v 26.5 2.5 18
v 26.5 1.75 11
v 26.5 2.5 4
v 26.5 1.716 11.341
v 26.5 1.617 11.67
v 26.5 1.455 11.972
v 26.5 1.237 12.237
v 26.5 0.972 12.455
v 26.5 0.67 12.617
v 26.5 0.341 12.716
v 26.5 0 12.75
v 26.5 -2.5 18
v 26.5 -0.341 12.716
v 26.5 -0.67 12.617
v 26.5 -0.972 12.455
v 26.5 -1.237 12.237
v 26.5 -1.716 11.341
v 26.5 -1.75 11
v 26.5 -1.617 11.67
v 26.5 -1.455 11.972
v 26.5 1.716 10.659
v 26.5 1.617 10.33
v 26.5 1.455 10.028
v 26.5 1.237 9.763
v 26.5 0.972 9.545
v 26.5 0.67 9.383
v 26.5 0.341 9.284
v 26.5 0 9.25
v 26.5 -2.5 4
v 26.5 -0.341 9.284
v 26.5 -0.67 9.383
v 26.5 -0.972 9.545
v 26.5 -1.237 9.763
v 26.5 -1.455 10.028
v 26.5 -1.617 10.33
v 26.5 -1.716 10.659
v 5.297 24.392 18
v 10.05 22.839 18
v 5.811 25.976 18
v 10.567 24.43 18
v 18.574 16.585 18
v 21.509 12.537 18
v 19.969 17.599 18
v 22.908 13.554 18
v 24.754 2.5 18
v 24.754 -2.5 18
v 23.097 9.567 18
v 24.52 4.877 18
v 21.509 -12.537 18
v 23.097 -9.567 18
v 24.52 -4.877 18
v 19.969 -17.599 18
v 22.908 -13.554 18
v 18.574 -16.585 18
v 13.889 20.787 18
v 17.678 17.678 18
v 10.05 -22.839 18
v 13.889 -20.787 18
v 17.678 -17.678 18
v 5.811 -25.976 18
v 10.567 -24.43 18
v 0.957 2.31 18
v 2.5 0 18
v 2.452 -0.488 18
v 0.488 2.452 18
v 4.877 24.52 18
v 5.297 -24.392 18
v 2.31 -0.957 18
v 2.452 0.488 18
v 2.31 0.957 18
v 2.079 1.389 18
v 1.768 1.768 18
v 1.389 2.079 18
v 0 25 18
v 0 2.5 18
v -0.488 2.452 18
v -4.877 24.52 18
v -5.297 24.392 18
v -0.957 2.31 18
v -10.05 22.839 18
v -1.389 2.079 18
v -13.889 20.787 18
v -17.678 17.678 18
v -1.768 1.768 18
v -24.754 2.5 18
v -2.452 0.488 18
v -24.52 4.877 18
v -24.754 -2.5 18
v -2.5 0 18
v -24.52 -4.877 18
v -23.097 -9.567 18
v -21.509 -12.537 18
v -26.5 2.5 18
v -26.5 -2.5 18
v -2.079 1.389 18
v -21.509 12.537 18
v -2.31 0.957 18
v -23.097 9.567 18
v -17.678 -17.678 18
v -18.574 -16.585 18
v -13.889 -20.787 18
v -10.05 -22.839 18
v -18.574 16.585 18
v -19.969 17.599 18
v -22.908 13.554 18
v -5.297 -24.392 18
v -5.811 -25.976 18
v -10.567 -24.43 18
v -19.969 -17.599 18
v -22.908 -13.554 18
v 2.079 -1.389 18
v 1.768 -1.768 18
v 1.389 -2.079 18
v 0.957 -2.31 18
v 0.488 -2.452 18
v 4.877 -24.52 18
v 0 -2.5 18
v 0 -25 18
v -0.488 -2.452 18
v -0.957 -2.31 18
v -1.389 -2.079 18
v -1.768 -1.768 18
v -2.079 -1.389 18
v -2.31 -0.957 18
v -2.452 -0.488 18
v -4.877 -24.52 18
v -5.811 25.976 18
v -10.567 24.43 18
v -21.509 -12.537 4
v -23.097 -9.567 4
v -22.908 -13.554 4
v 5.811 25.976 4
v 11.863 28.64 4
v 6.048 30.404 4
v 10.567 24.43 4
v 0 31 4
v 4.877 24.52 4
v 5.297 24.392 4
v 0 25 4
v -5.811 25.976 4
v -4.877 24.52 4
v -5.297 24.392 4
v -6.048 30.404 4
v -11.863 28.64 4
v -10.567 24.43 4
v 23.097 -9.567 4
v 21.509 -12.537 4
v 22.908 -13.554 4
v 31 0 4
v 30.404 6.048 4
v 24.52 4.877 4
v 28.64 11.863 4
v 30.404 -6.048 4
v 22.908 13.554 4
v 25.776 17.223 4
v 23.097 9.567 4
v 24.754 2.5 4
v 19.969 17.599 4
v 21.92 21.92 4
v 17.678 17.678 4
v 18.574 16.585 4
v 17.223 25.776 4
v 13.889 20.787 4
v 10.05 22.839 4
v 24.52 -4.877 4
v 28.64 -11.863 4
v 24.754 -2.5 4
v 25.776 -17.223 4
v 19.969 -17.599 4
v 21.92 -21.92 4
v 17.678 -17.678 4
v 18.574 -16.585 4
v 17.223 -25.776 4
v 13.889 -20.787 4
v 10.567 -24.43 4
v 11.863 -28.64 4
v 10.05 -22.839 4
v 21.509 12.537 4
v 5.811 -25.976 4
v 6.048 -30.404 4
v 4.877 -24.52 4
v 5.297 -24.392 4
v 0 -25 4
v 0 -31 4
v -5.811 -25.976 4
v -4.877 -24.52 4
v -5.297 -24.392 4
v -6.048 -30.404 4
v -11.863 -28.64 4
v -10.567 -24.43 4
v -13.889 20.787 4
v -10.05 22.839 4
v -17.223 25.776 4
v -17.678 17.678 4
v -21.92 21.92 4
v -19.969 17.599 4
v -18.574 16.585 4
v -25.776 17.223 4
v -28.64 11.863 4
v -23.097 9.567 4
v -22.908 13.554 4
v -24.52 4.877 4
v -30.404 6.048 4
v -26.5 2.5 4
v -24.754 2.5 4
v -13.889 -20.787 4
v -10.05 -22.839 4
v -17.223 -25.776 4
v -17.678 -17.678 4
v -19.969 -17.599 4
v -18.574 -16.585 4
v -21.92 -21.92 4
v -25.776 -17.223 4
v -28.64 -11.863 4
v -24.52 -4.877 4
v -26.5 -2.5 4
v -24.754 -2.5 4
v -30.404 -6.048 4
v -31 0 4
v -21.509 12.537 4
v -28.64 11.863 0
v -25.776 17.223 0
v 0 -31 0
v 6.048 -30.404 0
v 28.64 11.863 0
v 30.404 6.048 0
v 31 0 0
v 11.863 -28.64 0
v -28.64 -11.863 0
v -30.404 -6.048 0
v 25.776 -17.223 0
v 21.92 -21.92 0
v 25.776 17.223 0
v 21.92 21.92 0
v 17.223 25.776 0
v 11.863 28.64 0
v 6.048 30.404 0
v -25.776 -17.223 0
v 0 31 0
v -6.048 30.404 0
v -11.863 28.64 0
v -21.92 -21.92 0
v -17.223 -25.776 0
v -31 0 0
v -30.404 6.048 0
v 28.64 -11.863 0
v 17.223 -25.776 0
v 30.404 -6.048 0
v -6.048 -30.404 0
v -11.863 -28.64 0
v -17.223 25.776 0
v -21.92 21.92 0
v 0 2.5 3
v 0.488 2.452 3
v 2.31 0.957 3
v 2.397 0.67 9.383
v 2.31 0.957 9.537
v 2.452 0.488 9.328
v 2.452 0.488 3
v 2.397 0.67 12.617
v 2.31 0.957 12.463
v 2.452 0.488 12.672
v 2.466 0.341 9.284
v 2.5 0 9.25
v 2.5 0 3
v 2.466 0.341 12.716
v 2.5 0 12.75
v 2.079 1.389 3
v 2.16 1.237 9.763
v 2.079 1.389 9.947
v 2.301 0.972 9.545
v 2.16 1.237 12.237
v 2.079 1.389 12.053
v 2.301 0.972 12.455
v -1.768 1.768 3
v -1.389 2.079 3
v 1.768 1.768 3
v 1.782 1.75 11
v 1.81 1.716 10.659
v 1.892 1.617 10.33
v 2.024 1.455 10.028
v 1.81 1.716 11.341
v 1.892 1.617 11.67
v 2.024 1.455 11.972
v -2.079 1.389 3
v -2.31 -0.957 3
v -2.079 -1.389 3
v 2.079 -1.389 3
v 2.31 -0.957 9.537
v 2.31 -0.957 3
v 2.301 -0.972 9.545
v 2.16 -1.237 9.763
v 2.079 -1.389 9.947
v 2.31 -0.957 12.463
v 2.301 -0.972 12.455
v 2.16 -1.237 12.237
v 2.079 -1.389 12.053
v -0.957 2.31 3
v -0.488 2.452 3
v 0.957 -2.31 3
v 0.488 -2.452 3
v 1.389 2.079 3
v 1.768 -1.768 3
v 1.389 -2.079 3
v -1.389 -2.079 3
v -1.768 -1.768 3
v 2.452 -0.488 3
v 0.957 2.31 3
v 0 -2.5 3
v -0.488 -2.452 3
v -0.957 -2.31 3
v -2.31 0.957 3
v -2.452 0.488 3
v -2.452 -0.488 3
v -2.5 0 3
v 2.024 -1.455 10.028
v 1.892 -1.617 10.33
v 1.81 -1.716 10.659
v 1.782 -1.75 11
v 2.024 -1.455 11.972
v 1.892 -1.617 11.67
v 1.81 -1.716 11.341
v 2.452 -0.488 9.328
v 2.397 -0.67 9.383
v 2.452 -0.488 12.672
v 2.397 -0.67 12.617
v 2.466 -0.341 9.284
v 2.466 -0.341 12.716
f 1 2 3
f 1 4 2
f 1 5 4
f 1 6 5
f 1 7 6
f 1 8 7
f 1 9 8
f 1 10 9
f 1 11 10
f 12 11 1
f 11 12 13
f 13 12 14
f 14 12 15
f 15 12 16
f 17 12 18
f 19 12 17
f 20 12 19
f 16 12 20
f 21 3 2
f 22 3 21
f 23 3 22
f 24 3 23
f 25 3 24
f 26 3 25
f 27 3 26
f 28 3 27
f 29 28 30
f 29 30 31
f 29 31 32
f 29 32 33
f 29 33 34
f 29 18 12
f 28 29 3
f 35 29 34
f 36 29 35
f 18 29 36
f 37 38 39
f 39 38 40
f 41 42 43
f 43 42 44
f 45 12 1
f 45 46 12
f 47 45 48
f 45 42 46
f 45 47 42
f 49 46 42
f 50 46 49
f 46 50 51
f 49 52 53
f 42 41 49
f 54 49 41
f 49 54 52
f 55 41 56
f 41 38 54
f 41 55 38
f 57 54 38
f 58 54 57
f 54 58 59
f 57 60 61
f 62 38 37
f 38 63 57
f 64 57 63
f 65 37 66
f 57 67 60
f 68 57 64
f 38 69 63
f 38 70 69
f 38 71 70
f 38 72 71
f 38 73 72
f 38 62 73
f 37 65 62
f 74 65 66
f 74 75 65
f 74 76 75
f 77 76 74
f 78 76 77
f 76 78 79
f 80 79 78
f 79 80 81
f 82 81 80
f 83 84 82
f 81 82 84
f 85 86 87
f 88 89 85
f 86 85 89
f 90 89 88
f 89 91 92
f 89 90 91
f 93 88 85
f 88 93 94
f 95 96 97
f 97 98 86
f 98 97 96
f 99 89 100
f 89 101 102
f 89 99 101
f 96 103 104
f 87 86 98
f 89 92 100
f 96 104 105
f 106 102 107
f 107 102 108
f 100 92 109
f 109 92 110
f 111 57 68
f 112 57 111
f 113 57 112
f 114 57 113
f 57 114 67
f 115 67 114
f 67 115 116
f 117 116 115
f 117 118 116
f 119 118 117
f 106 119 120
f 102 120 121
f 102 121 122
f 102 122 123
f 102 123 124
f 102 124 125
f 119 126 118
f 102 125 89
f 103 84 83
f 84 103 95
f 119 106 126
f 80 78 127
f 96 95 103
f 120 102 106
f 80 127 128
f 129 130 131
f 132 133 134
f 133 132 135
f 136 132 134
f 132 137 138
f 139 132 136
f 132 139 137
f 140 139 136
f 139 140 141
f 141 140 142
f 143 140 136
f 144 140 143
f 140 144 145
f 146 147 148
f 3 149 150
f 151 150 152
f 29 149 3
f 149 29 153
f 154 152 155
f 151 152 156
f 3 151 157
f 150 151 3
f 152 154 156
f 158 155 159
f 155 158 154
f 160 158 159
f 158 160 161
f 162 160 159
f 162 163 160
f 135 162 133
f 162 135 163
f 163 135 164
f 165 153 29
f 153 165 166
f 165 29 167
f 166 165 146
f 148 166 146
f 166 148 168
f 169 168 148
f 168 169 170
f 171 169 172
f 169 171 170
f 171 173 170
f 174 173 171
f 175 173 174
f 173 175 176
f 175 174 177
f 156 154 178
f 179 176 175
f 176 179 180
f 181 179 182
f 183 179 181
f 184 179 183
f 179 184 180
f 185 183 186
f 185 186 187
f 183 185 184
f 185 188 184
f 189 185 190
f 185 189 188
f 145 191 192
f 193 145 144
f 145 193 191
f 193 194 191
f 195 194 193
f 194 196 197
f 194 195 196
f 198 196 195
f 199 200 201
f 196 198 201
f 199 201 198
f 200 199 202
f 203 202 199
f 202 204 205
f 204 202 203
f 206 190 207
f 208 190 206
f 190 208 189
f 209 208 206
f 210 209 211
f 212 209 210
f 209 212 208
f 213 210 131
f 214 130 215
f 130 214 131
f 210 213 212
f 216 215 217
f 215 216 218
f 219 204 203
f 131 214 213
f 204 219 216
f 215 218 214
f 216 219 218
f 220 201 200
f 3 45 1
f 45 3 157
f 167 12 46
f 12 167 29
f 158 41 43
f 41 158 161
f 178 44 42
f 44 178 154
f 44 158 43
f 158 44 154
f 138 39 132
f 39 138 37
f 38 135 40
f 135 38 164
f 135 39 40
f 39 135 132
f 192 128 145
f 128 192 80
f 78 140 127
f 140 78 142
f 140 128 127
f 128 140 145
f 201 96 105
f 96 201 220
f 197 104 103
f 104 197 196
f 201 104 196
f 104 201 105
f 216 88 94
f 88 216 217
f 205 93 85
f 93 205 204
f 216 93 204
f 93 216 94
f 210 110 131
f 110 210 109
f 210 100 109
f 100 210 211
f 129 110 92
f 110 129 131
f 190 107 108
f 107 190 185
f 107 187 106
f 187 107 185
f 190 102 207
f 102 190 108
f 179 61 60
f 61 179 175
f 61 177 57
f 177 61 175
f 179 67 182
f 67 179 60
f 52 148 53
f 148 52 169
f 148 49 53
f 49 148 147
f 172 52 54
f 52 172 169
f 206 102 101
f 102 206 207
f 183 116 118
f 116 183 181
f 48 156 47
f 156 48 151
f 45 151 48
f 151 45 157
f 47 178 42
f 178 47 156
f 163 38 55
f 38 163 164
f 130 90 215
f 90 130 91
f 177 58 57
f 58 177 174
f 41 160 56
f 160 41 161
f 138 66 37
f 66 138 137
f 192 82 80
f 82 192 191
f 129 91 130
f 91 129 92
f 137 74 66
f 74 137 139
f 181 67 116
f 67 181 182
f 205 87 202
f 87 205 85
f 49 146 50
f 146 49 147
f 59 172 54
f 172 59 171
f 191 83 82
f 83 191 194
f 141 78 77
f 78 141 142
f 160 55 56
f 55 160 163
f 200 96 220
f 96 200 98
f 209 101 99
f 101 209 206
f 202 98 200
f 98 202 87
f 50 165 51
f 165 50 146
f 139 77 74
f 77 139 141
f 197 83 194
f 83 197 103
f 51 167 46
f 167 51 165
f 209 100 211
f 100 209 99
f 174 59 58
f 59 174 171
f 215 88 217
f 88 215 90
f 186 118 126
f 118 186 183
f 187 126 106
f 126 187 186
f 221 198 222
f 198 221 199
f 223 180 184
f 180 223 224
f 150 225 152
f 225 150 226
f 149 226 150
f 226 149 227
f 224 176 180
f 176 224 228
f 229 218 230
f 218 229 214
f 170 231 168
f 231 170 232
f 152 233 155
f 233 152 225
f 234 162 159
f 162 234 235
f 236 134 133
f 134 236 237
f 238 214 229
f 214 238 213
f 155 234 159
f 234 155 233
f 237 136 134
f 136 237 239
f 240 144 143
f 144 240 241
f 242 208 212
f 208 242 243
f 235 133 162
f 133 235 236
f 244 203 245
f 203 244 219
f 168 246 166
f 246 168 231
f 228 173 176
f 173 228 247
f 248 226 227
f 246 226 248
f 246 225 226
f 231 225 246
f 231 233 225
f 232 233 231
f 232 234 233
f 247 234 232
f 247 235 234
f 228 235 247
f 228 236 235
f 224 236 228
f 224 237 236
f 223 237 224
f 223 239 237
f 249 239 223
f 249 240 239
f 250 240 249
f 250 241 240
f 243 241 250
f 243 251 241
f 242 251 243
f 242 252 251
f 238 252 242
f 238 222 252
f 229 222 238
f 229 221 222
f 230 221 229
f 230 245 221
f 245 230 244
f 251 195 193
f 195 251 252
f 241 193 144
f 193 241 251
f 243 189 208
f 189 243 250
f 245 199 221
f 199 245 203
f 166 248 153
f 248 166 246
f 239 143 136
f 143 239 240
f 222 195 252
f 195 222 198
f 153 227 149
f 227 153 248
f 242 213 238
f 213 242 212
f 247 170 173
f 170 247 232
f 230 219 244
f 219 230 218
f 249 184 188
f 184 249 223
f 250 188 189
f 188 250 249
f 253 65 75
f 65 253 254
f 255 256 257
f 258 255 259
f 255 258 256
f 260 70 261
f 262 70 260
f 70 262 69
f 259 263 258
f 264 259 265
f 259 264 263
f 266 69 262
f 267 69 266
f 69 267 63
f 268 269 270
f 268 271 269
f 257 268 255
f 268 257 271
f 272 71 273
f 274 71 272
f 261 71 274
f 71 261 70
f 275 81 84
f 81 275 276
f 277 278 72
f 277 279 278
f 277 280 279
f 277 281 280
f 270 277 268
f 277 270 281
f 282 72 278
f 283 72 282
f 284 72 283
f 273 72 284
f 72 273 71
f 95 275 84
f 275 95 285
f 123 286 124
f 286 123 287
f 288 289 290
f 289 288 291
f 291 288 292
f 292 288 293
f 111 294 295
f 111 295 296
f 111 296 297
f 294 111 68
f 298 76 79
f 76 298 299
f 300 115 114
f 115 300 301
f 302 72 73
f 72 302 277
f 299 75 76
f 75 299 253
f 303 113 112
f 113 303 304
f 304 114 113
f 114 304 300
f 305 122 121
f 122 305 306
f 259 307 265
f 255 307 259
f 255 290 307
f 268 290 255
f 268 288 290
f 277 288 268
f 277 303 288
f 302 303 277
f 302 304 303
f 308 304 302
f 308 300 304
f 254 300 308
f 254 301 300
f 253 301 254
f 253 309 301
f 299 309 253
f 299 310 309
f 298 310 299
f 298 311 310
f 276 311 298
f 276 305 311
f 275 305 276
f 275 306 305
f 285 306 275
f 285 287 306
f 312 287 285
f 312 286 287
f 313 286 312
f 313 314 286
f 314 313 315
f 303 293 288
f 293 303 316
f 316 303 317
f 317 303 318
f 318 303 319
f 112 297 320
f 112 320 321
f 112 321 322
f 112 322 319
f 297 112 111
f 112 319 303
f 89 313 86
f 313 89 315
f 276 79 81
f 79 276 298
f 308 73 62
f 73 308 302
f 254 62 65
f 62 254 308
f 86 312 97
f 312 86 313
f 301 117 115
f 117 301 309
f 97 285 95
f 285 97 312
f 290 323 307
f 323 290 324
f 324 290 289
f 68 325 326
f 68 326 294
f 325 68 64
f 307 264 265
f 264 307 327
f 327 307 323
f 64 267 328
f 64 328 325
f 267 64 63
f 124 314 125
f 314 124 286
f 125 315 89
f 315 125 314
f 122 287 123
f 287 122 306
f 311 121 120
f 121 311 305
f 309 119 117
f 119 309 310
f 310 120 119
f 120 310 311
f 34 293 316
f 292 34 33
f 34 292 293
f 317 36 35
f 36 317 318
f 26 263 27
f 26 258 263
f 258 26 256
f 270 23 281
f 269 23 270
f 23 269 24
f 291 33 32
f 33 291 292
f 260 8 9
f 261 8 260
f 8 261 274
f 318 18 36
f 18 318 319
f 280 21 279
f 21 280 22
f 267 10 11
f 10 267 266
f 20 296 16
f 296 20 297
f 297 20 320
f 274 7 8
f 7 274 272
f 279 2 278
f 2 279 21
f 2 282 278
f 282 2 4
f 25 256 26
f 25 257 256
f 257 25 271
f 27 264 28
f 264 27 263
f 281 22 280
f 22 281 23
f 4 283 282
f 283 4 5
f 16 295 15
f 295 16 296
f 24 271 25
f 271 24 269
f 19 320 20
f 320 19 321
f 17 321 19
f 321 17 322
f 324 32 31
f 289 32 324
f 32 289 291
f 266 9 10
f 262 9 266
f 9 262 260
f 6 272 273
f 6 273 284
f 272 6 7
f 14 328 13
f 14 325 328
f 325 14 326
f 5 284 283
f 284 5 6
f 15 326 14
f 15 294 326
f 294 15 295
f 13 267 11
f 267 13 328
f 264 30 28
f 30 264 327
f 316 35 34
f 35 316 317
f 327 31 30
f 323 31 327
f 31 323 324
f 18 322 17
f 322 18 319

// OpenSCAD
$fn = 32;

// ----------------------------------------------------------------------
// Control knob: skirt knob with grip ribs
// ----------------------------------------------------------------------

// --- parameters (mm) ---
skirt_d = 62;             // skirt diameter
skirt_t = 4;              // skirt thickness
rib_w = 5;                // grip rib width
rib_out = 2.5;            // grip rib radial protrusion
n_ribs = 10;              // number of grip ribs
knob_d = 50;              // knob body diameter
knob_h = 14;              // knob body height
bore_d = 5;               // shaft bore diameter
set_d = 3.5;              // set screw bore diameter

rib_step = 360 / n_ribs;  // rib angular step
total_h = skirt_t + knob_h;  // overall height

difference() {
  union() {
    translate([0, 0, skirt_t]) cylinder(h = knob_h, d = knob_d);
    cylinder(h = skirt_t, d = skirt_d);
    for (i = [0 : n_ribs - 1])
      rotate([0, 0, i * rib_step])
        translate([knob_d / 2 - 1, -rib_w / 2, skirt_t])
          cube([rib_out, rib_w, knob_h]);
  }
  translate([0, 0, skirt_t - 1]) cylinder(h = knob_h + 2, d = bore_d);
  translate([-1, 0, skirt_t + knob_h / 2]) rotate([0, 90, 0])
    cylinder(h = knob_d / 2 + bore_d / 2 + 2, d = set_d);
}
